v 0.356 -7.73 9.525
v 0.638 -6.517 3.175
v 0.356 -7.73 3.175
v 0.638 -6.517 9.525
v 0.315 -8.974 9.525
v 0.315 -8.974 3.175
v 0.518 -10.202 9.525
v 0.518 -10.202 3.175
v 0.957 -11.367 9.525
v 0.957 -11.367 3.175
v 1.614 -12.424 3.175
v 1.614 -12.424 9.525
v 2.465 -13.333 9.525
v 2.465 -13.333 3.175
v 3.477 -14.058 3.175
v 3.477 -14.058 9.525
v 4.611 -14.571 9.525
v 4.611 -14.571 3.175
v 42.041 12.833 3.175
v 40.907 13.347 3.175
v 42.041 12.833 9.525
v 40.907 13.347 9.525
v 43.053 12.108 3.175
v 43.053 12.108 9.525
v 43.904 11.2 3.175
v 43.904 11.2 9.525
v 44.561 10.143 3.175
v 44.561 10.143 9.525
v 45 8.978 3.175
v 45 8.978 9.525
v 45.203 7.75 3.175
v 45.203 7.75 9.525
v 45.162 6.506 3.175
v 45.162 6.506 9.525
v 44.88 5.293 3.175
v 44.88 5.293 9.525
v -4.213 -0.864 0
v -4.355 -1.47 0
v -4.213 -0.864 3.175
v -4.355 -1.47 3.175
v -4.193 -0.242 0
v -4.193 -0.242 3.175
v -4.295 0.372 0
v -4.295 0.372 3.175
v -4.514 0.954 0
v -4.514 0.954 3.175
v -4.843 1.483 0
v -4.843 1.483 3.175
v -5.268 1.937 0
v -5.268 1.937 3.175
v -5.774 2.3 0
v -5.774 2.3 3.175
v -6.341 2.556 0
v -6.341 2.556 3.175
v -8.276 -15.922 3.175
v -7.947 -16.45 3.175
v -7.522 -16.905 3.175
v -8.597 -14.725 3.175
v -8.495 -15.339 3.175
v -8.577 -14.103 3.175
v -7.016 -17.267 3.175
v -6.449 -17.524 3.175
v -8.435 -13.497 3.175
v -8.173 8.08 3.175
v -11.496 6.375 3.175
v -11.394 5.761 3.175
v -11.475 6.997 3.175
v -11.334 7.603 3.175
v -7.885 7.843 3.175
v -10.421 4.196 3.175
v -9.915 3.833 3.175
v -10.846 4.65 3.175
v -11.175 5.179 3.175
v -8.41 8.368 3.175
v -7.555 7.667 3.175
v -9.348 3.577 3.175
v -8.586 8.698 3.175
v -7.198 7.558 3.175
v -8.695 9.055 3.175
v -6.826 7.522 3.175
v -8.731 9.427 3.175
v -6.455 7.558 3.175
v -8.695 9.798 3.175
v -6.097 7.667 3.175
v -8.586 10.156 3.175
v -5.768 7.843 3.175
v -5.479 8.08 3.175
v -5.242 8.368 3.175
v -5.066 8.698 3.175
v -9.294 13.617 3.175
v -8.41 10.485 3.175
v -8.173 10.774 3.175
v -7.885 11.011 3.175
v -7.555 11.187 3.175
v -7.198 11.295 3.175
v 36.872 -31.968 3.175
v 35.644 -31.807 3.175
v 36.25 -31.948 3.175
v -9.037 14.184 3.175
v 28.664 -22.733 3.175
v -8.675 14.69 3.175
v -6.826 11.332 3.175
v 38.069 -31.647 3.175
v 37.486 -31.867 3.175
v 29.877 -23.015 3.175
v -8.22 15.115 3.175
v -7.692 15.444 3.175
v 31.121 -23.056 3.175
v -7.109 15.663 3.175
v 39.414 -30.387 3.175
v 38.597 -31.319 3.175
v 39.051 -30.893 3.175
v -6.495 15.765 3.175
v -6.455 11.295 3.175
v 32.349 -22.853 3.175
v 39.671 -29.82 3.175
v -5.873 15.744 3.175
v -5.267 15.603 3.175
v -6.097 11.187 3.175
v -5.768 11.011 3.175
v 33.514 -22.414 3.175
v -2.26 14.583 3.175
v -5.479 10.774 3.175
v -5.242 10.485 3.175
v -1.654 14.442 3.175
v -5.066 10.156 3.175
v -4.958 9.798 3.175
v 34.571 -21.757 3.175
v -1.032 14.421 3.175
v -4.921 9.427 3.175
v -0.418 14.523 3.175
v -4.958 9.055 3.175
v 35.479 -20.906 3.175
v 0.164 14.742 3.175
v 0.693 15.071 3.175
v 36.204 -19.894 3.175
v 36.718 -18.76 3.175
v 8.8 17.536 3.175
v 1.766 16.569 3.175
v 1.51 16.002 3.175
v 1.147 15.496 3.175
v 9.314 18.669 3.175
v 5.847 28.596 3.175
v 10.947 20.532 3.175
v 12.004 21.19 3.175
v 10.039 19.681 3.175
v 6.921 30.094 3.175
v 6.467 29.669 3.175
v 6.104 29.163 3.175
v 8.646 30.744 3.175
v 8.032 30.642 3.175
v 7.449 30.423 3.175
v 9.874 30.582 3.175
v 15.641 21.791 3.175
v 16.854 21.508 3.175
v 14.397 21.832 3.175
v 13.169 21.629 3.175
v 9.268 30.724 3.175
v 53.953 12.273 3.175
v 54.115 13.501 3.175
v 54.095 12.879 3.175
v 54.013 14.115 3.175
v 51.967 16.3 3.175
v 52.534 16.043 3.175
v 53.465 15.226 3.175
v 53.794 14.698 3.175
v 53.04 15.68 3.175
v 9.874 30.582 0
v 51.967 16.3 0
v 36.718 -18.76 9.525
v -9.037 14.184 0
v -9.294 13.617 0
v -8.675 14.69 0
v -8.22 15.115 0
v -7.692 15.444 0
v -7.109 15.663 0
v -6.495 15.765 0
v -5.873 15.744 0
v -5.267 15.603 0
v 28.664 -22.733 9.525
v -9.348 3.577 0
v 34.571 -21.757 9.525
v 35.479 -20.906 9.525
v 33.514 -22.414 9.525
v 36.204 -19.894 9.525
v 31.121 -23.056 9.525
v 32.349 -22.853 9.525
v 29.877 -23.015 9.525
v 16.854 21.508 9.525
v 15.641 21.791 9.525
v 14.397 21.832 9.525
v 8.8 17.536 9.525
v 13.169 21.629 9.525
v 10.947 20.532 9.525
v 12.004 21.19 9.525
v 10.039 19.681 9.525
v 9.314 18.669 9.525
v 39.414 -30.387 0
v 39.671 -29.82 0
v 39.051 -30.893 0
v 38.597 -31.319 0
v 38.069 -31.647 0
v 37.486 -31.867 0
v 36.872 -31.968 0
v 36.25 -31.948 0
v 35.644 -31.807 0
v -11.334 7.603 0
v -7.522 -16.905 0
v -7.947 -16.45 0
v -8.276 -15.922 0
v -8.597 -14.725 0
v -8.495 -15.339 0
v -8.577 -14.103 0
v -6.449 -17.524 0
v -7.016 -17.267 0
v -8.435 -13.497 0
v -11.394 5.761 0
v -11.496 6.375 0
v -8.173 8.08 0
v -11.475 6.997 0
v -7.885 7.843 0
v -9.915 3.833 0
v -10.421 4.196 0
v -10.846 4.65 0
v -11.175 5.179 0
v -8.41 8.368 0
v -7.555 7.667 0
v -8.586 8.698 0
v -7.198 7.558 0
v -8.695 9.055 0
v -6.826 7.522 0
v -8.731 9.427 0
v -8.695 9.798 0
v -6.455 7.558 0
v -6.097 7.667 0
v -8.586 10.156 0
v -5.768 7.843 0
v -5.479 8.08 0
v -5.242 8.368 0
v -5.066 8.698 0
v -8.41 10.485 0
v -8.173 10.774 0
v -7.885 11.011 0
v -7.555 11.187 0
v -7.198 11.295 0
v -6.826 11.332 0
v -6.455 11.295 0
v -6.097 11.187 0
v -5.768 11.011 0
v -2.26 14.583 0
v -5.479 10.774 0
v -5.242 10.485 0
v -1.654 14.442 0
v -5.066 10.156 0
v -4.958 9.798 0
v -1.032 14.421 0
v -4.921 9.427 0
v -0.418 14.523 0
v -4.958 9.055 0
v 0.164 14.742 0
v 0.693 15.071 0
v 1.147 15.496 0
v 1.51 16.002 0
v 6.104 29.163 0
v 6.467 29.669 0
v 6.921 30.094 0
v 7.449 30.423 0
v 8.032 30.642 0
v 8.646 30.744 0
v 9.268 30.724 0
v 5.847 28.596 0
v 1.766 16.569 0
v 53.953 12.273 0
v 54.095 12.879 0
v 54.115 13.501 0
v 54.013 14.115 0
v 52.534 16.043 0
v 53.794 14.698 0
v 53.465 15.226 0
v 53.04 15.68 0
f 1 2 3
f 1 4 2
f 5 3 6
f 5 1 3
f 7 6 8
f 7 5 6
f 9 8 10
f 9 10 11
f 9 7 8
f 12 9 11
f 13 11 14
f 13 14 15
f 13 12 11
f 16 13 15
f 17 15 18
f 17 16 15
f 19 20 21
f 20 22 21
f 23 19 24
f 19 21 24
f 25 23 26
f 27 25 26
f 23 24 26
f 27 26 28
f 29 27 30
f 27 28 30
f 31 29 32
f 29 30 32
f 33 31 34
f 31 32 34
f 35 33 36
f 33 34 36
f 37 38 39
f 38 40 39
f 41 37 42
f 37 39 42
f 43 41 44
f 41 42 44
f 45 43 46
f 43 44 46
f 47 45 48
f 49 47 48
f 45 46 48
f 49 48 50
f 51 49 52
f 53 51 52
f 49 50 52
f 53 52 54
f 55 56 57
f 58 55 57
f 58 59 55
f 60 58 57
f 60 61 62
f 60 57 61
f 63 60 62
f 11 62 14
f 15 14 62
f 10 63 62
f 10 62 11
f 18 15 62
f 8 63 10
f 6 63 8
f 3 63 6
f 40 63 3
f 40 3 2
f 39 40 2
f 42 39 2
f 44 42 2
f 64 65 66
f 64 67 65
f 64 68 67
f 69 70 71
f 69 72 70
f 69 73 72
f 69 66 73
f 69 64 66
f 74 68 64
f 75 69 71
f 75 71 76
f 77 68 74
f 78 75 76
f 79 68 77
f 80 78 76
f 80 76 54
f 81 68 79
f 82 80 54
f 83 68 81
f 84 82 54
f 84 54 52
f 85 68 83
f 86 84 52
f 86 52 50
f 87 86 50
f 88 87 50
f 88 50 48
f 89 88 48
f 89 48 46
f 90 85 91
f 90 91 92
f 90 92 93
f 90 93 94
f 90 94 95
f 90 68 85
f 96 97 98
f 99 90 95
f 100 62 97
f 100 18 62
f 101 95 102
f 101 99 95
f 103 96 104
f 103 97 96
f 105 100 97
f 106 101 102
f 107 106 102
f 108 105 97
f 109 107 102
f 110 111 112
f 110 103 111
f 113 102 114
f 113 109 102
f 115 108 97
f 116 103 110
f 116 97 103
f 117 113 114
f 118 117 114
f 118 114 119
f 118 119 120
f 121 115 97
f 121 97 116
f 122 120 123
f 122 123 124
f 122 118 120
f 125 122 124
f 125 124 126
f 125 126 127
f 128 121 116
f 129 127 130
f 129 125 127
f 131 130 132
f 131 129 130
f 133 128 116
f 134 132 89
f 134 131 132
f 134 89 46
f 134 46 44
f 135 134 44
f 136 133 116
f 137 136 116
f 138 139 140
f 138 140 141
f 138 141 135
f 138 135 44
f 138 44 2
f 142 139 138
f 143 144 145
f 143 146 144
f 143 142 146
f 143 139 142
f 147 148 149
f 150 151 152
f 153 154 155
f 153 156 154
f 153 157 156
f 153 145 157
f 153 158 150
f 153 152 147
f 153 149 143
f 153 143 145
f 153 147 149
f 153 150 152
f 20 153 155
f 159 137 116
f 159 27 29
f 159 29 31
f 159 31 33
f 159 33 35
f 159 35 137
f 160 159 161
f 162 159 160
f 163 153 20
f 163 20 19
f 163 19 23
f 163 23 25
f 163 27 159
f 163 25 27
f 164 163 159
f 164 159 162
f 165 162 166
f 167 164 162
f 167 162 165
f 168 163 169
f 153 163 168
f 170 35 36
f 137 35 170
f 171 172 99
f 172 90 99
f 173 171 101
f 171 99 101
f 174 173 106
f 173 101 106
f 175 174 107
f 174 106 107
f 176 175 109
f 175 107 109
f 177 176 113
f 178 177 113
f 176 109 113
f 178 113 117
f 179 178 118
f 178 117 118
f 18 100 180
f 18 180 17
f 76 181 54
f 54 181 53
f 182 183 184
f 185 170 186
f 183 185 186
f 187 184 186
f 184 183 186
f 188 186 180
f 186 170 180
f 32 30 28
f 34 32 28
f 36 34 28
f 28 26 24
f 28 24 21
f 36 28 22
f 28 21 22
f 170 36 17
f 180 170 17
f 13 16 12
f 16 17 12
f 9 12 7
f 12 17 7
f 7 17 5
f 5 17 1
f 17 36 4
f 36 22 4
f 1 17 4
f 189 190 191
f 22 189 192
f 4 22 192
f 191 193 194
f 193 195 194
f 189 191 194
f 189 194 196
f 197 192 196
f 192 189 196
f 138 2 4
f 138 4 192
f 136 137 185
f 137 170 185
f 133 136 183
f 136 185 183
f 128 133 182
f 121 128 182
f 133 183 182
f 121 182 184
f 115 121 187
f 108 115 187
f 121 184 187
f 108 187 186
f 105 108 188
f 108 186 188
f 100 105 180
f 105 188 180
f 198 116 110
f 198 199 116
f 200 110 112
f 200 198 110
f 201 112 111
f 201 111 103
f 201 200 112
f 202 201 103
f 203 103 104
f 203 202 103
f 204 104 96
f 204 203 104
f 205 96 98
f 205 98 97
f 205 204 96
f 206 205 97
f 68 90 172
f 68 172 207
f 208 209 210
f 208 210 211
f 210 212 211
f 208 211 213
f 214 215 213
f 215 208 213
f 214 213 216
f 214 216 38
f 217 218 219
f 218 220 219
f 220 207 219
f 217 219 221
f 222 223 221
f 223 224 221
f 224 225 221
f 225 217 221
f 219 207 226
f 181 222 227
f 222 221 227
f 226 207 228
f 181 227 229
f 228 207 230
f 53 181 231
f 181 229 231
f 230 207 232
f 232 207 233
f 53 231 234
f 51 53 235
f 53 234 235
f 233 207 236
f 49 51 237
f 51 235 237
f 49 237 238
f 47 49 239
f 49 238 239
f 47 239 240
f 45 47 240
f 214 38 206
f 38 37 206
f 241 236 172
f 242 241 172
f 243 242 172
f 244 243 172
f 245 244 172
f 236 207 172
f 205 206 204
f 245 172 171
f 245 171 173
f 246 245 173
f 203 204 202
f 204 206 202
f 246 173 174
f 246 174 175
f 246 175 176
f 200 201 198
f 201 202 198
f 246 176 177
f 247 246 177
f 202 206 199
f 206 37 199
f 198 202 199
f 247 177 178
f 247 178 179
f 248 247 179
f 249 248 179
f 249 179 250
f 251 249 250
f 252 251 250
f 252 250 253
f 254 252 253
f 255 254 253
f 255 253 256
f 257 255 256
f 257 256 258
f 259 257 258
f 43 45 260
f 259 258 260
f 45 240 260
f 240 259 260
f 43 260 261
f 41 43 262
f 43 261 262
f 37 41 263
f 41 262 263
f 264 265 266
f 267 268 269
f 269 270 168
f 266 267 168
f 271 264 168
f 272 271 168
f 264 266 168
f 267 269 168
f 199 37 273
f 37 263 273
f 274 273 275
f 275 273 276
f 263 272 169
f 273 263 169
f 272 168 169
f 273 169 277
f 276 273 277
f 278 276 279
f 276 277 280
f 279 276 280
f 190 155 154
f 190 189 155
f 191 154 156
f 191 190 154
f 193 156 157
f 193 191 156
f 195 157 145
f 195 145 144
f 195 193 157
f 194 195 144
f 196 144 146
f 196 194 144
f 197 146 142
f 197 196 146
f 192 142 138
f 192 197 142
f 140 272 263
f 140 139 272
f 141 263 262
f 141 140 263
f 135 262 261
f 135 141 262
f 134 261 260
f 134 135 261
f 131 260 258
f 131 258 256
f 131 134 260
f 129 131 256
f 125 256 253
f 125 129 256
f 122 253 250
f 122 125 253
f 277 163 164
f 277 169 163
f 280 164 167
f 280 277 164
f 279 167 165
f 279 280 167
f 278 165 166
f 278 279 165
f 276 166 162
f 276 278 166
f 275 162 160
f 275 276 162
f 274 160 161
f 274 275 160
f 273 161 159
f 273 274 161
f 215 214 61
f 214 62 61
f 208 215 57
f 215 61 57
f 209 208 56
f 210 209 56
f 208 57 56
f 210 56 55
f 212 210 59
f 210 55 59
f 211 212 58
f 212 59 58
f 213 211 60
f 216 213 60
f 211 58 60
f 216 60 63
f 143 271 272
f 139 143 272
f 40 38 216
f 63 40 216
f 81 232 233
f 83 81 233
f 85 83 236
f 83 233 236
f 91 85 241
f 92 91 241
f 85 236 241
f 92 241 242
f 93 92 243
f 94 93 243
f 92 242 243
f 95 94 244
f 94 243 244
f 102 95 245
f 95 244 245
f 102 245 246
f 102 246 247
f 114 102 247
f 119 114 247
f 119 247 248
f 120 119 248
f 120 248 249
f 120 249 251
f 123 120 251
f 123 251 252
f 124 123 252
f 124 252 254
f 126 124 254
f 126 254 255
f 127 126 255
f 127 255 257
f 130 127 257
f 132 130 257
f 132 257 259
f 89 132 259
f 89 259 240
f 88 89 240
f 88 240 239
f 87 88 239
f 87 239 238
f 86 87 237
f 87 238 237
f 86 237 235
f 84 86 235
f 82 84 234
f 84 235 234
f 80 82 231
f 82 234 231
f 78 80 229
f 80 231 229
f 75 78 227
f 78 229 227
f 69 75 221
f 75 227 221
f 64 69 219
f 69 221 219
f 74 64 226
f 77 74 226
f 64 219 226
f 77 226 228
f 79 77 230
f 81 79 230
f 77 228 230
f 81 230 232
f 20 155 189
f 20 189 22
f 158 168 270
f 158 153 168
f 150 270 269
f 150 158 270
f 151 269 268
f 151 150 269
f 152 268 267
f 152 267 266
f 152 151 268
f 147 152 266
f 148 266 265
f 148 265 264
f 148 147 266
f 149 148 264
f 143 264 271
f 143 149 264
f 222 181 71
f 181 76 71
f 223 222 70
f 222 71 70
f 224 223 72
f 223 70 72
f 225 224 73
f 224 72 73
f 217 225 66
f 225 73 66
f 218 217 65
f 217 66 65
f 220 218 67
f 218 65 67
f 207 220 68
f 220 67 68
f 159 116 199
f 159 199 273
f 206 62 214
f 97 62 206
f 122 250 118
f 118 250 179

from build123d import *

# Parameters (mm, degrees)
BOSS_EXTRUDE1_DEPTH    = 3.175
CUT_EXTRUDE1_DEPTH     = 66.066884919
CUT_EXTRUDE2_DEPTH     = 65.107450137
BOSS_EXTRUDE2_DEPTH    = 6.35
M3_5_CLEARANCE_HOLE1_D = 3.81
FILLET1_R              = 3.175
FILLET2_R              = 6.35


with BuildPart() as part:
    # Sketch1 → Boss-Extrude1 (new body)
    with BuildSketch(Plane.XY.offset(3.175)):
        Polygon((54.97356176, 15.279413628), (-2.152444785, 34.663040771), (-18.475499222, -13.443070004), (38.650507323, -32.826697147), align=None)
    extrude(amount=-BOSS_EXTRUDE1_DEPTH)

    # Sketch2 → Cut-Extrude1 (cut, through all)
    with BuildSketch(Plane(origin=(0, 0, 0), x_dir=(-1, 0, 0), z_dir=(0, 0, -1))):
        Polygon((2.152444785, 34.663040771), (-6.867450985, 31.602468064), (-0.746305571, 13.562676524), (8.273590199, 16.62324923), align=None)
    extrude(amount=-CUT_EXTRUDE1_DEPTH, mode=Mode.SUBTRACT)

    # Sketch3 → Cut-Extrude2 (cut, through all)
    with BuildSketch(Plane(origin=(0, 0, 0), x_dir=(-1, 0, 0), z_dir=(0, 0, -1))):
        Polygon((18.475499222, -13.443070004), (12.354353808, 4.596721537), (3.334458038, 1.53614883), (9.455603451, -16.503642711), align=None)
    extrude(amount=-CUT_EXTRUDE2_DEPTH, mode=Mode.SUBTRACT)

    # Sketch4 → Boss-Extrude2 (add)
    with BuildSketch(Plane.XY.offset(3.175)):
        Polygon((46.919916108, 11.306531586), (34.677625281, -24.773051496), (-1.4019578, -12.530760668), (10.840333027, 23.548822413), align=None)
    extrude(amount=BOSS_EXTRUDE2_DEPTH)

    # M3.5 Clearance Hole1 (through all)
    with Locations(Plane.XY.offset(3.175)):
        with Locations((-6.826278972, 9.426563937)):
            Hole(M3_5_CLEARANCE_HOLE1_D / 2)

    # Fillet1
    fillet1_edges = [part.edges().sort_by_distance(p)[0] for p in [
        (-8.273590199, 16.62324923, 1.5875),
        (0.746305571, 13.562676524, 1.5875),
        (6.867450985, 31.602468064, 1.5875),
        (-9.455603451, -16.503642711, 1.5875),
        (-3.334458038, 1.53614883, 1.5875),
        (-12.354353808, 4.596721537, 1.5875),
        (38.650507323, -32.826697147, 1.5875),
        (54.97356176, 15.279413628, 1.5875),
    ]]
    fillet(fillet1_edges, radius=FILLET1_R)

    # Fillet2
    fillet2_edges = [part.edges().sort_by_distance(p)[0] for p in [
        (46.919916108, 11.306531586, 6.35),
        (10.840333027, 23.548822413, 6.35),
        (-1.4019578, -12.530760668, 6.35),
        (34.677625281, -24.773051496, 6.35),
    ]]
    fillet(fillet2_edges, radius=FILLET2_R)


solid = part.part
